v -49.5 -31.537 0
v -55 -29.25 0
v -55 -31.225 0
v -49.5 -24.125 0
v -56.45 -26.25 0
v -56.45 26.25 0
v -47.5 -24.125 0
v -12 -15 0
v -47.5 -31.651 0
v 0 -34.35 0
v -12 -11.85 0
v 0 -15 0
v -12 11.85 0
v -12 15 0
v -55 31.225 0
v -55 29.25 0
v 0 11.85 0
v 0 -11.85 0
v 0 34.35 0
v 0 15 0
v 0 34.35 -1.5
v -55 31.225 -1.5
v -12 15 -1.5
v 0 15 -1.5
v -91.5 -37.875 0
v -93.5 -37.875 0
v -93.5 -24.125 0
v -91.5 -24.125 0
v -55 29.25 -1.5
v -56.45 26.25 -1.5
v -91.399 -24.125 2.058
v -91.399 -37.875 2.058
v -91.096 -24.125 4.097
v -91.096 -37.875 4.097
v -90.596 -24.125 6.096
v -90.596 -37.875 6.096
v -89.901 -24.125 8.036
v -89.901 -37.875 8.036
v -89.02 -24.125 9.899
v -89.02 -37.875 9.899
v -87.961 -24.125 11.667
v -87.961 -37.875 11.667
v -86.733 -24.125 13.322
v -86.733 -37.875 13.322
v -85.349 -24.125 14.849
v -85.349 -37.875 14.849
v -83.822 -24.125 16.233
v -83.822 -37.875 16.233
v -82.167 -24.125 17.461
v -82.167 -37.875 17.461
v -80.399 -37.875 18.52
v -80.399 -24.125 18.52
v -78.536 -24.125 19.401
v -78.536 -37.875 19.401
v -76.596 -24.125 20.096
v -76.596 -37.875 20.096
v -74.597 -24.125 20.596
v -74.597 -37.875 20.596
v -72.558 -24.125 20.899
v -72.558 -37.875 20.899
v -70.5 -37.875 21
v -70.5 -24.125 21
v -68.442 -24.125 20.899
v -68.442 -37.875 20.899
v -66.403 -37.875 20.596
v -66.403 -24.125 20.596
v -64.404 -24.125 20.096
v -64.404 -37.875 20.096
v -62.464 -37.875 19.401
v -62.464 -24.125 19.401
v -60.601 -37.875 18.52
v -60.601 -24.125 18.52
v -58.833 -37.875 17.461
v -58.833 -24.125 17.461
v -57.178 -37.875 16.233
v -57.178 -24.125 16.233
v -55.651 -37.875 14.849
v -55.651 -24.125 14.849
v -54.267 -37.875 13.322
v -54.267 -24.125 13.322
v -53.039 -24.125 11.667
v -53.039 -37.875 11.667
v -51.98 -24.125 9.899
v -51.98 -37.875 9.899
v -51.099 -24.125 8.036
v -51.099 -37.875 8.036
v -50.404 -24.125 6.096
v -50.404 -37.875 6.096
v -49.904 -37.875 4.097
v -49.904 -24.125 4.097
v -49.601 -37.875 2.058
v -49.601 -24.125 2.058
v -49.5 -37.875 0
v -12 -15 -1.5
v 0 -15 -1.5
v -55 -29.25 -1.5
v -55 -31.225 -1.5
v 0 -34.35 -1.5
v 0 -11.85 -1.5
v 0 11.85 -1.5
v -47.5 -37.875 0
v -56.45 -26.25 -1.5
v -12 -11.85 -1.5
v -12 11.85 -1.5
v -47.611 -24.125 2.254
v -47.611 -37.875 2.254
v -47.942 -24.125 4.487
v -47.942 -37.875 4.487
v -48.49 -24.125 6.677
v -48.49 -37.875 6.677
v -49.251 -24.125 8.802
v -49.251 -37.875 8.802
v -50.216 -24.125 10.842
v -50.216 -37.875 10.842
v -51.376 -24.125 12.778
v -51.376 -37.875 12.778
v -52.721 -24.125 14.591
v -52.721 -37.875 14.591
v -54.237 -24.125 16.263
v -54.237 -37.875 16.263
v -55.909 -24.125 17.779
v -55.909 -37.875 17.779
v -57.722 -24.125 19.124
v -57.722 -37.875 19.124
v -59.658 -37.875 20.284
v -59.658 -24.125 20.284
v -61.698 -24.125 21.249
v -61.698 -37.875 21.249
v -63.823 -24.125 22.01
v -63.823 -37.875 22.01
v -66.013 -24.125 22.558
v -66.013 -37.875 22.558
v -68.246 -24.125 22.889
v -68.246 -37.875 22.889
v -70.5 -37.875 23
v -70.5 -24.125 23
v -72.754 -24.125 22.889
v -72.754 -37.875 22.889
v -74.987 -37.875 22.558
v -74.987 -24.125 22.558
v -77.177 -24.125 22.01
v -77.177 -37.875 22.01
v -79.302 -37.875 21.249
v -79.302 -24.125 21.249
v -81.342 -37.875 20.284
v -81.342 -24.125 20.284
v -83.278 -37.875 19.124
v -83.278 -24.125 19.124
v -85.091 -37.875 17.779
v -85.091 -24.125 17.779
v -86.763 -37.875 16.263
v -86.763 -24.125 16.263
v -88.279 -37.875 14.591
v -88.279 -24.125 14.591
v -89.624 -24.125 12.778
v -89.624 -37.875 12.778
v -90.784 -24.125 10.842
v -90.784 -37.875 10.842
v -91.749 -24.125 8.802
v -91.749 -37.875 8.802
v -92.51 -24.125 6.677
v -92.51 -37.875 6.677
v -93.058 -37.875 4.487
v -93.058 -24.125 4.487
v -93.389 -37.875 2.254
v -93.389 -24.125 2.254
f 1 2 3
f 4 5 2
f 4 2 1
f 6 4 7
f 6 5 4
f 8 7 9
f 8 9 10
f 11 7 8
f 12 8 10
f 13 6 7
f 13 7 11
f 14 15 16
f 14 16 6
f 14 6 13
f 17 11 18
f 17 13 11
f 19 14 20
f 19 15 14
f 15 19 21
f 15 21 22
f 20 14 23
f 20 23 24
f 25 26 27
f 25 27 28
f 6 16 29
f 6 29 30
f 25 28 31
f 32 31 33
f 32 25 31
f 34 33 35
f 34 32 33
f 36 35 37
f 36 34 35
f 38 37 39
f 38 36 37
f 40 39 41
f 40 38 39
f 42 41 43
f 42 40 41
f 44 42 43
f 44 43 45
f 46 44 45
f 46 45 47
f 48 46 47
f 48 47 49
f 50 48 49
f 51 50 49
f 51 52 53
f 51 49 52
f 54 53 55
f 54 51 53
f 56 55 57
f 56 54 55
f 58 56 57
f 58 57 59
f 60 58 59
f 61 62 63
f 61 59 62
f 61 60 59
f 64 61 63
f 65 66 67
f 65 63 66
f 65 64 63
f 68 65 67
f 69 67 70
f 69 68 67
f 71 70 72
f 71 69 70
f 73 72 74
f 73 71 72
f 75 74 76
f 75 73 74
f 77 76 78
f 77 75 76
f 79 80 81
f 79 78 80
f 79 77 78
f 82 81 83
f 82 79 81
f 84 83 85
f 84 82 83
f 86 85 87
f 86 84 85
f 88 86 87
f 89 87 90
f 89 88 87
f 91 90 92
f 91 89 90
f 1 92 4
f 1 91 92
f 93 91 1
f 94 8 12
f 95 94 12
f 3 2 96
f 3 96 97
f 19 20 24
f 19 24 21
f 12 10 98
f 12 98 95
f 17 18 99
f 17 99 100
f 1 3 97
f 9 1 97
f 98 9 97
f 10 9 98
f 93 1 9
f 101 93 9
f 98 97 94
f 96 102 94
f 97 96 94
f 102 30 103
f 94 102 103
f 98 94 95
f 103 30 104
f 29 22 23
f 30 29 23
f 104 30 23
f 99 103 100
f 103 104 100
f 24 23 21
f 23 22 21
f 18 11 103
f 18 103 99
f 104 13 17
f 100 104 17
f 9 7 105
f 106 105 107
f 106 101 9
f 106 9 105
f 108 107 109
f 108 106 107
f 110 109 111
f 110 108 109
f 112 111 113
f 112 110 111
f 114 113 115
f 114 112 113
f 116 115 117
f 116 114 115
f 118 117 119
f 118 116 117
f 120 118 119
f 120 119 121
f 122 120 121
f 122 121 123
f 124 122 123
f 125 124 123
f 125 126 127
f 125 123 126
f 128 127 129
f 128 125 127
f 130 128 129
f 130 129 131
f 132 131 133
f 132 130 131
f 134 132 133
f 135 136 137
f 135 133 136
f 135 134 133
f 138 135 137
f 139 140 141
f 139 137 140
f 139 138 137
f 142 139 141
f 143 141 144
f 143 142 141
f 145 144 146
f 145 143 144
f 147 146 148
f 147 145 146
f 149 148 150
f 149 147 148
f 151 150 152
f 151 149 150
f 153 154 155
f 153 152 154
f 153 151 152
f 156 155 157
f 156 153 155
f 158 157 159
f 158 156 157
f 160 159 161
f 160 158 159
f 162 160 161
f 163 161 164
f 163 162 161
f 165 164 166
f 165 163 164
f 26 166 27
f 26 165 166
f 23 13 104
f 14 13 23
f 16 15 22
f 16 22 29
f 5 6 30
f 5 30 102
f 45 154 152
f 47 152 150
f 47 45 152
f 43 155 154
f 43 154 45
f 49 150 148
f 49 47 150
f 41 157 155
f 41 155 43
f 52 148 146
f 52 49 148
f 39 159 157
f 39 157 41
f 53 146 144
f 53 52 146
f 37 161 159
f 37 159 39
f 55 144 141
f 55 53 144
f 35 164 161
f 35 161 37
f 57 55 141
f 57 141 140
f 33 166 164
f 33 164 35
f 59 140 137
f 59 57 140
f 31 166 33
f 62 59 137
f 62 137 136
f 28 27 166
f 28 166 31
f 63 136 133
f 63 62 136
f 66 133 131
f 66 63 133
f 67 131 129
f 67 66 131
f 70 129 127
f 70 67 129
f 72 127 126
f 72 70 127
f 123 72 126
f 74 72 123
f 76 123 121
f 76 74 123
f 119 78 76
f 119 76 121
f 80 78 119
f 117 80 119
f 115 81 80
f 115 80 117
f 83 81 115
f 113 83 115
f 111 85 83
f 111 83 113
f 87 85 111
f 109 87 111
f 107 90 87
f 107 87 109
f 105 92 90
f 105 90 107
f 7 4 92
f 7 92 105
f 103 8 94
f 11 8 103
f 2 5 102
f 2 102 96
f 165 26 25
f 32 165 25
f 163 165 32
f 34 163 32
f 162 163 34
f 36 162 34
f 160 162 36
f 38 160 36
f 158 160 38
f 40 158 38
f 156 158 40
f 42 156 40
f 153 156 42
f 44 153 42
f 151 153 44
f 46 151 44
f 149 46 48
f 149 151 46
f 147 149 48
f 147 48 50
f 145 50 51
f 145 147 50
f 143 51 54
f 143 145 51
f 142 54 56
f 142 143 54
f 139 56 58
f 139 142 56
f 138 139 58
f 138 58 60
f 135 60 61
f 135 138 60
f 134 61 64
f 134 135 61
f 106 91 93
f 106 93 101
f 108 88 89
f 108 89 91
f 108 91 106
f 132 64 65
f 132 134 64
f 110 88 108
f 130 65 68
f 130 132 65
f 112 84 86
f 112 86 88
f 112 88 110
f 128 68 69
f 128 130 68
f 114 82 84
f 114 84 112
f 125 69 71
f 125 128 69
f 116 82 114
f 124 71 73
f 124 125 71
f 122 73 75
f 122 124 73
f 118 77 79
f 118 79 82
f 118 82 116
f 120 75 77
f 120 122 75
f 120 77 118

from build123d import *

# Parameters (mm, degrees)
F1_DEPTH = 1.5
F2_W     = 12
F2_H     = 3.15
F3_DEPTH = 1.5
F5_DEPTH = 1.5
F7_DEPTH = 37.875
F8_DEPTH = 62


with BuildPart() as f1:
    # F0 (on Top) → F1 (new body)
    with BuildSketch(Plane.XY):
        Polygon((0, -34.35), (0, 34.35), (-55, 31.225), (-55, -31.225), align=None)
    extrude(amount=-F1_DEPTH)

    # F2 (on face) → F3 (cut, through all)
    with BuildSketch(Plane.XY):
        with Locations((-6, 13.425)):
            Rectangle(F2_W, F2_H)
        with Locations((-6, -13.425)):
            Rectangle(F2_W, F2_H)
    extrude(amount=-F3_DEPTH, mode=Mode.SUBTRACT)

    # F4 (on Top) → F5 (join, through all)
    with BuildSketch(Plane.XY):
        Polygon((-55, -29.25), (-55, 29.25), (-56.45, 26.25), (-56.45, -26.25), align=None)
    extrude(amount=-F5_DEPTH)

    # F6 (on Front) → F7 (join, symmetric)
    with BuildSketch(Plane.XZ):
        with BuildLine():
            ThreePointArc((-91.5, 0), (-70.5, 21), (-49.5, 0))
            Line((-49.5, 0), (-47.5, 0))
            ThreePointArc((-47.5, 0), (-70.5, 23), (-93.5, 0))
            Line((-93.5, 0), (-91.5, 0))
        make_face()
    extrude(amount=F7_DEPTH, both=True)

    # F7_face (on face) → F8 (cut)
    with BuildSketch(Plane(origin=(-70.5, 37.875, 14.015281), x_dir=(1, 0, 0), z_dir=(0, 1, 0))):
        with BuildLine():
            Line((-21, 14.015281), (-23, 14.015281))
            ThreePointArc((-23, 14.015281), (0, -8.984719), (23, 14.015281))
            Line((23, 14.015281), (21, 14.015281))
            ThreePointArc((21, 14.015281), (0, -6.984719), (-21, 14.015281))
        make_face()
    extrude(amount=-F8_DEPTH, mode=Mode.SUBTRACT)


solid = f1.part
